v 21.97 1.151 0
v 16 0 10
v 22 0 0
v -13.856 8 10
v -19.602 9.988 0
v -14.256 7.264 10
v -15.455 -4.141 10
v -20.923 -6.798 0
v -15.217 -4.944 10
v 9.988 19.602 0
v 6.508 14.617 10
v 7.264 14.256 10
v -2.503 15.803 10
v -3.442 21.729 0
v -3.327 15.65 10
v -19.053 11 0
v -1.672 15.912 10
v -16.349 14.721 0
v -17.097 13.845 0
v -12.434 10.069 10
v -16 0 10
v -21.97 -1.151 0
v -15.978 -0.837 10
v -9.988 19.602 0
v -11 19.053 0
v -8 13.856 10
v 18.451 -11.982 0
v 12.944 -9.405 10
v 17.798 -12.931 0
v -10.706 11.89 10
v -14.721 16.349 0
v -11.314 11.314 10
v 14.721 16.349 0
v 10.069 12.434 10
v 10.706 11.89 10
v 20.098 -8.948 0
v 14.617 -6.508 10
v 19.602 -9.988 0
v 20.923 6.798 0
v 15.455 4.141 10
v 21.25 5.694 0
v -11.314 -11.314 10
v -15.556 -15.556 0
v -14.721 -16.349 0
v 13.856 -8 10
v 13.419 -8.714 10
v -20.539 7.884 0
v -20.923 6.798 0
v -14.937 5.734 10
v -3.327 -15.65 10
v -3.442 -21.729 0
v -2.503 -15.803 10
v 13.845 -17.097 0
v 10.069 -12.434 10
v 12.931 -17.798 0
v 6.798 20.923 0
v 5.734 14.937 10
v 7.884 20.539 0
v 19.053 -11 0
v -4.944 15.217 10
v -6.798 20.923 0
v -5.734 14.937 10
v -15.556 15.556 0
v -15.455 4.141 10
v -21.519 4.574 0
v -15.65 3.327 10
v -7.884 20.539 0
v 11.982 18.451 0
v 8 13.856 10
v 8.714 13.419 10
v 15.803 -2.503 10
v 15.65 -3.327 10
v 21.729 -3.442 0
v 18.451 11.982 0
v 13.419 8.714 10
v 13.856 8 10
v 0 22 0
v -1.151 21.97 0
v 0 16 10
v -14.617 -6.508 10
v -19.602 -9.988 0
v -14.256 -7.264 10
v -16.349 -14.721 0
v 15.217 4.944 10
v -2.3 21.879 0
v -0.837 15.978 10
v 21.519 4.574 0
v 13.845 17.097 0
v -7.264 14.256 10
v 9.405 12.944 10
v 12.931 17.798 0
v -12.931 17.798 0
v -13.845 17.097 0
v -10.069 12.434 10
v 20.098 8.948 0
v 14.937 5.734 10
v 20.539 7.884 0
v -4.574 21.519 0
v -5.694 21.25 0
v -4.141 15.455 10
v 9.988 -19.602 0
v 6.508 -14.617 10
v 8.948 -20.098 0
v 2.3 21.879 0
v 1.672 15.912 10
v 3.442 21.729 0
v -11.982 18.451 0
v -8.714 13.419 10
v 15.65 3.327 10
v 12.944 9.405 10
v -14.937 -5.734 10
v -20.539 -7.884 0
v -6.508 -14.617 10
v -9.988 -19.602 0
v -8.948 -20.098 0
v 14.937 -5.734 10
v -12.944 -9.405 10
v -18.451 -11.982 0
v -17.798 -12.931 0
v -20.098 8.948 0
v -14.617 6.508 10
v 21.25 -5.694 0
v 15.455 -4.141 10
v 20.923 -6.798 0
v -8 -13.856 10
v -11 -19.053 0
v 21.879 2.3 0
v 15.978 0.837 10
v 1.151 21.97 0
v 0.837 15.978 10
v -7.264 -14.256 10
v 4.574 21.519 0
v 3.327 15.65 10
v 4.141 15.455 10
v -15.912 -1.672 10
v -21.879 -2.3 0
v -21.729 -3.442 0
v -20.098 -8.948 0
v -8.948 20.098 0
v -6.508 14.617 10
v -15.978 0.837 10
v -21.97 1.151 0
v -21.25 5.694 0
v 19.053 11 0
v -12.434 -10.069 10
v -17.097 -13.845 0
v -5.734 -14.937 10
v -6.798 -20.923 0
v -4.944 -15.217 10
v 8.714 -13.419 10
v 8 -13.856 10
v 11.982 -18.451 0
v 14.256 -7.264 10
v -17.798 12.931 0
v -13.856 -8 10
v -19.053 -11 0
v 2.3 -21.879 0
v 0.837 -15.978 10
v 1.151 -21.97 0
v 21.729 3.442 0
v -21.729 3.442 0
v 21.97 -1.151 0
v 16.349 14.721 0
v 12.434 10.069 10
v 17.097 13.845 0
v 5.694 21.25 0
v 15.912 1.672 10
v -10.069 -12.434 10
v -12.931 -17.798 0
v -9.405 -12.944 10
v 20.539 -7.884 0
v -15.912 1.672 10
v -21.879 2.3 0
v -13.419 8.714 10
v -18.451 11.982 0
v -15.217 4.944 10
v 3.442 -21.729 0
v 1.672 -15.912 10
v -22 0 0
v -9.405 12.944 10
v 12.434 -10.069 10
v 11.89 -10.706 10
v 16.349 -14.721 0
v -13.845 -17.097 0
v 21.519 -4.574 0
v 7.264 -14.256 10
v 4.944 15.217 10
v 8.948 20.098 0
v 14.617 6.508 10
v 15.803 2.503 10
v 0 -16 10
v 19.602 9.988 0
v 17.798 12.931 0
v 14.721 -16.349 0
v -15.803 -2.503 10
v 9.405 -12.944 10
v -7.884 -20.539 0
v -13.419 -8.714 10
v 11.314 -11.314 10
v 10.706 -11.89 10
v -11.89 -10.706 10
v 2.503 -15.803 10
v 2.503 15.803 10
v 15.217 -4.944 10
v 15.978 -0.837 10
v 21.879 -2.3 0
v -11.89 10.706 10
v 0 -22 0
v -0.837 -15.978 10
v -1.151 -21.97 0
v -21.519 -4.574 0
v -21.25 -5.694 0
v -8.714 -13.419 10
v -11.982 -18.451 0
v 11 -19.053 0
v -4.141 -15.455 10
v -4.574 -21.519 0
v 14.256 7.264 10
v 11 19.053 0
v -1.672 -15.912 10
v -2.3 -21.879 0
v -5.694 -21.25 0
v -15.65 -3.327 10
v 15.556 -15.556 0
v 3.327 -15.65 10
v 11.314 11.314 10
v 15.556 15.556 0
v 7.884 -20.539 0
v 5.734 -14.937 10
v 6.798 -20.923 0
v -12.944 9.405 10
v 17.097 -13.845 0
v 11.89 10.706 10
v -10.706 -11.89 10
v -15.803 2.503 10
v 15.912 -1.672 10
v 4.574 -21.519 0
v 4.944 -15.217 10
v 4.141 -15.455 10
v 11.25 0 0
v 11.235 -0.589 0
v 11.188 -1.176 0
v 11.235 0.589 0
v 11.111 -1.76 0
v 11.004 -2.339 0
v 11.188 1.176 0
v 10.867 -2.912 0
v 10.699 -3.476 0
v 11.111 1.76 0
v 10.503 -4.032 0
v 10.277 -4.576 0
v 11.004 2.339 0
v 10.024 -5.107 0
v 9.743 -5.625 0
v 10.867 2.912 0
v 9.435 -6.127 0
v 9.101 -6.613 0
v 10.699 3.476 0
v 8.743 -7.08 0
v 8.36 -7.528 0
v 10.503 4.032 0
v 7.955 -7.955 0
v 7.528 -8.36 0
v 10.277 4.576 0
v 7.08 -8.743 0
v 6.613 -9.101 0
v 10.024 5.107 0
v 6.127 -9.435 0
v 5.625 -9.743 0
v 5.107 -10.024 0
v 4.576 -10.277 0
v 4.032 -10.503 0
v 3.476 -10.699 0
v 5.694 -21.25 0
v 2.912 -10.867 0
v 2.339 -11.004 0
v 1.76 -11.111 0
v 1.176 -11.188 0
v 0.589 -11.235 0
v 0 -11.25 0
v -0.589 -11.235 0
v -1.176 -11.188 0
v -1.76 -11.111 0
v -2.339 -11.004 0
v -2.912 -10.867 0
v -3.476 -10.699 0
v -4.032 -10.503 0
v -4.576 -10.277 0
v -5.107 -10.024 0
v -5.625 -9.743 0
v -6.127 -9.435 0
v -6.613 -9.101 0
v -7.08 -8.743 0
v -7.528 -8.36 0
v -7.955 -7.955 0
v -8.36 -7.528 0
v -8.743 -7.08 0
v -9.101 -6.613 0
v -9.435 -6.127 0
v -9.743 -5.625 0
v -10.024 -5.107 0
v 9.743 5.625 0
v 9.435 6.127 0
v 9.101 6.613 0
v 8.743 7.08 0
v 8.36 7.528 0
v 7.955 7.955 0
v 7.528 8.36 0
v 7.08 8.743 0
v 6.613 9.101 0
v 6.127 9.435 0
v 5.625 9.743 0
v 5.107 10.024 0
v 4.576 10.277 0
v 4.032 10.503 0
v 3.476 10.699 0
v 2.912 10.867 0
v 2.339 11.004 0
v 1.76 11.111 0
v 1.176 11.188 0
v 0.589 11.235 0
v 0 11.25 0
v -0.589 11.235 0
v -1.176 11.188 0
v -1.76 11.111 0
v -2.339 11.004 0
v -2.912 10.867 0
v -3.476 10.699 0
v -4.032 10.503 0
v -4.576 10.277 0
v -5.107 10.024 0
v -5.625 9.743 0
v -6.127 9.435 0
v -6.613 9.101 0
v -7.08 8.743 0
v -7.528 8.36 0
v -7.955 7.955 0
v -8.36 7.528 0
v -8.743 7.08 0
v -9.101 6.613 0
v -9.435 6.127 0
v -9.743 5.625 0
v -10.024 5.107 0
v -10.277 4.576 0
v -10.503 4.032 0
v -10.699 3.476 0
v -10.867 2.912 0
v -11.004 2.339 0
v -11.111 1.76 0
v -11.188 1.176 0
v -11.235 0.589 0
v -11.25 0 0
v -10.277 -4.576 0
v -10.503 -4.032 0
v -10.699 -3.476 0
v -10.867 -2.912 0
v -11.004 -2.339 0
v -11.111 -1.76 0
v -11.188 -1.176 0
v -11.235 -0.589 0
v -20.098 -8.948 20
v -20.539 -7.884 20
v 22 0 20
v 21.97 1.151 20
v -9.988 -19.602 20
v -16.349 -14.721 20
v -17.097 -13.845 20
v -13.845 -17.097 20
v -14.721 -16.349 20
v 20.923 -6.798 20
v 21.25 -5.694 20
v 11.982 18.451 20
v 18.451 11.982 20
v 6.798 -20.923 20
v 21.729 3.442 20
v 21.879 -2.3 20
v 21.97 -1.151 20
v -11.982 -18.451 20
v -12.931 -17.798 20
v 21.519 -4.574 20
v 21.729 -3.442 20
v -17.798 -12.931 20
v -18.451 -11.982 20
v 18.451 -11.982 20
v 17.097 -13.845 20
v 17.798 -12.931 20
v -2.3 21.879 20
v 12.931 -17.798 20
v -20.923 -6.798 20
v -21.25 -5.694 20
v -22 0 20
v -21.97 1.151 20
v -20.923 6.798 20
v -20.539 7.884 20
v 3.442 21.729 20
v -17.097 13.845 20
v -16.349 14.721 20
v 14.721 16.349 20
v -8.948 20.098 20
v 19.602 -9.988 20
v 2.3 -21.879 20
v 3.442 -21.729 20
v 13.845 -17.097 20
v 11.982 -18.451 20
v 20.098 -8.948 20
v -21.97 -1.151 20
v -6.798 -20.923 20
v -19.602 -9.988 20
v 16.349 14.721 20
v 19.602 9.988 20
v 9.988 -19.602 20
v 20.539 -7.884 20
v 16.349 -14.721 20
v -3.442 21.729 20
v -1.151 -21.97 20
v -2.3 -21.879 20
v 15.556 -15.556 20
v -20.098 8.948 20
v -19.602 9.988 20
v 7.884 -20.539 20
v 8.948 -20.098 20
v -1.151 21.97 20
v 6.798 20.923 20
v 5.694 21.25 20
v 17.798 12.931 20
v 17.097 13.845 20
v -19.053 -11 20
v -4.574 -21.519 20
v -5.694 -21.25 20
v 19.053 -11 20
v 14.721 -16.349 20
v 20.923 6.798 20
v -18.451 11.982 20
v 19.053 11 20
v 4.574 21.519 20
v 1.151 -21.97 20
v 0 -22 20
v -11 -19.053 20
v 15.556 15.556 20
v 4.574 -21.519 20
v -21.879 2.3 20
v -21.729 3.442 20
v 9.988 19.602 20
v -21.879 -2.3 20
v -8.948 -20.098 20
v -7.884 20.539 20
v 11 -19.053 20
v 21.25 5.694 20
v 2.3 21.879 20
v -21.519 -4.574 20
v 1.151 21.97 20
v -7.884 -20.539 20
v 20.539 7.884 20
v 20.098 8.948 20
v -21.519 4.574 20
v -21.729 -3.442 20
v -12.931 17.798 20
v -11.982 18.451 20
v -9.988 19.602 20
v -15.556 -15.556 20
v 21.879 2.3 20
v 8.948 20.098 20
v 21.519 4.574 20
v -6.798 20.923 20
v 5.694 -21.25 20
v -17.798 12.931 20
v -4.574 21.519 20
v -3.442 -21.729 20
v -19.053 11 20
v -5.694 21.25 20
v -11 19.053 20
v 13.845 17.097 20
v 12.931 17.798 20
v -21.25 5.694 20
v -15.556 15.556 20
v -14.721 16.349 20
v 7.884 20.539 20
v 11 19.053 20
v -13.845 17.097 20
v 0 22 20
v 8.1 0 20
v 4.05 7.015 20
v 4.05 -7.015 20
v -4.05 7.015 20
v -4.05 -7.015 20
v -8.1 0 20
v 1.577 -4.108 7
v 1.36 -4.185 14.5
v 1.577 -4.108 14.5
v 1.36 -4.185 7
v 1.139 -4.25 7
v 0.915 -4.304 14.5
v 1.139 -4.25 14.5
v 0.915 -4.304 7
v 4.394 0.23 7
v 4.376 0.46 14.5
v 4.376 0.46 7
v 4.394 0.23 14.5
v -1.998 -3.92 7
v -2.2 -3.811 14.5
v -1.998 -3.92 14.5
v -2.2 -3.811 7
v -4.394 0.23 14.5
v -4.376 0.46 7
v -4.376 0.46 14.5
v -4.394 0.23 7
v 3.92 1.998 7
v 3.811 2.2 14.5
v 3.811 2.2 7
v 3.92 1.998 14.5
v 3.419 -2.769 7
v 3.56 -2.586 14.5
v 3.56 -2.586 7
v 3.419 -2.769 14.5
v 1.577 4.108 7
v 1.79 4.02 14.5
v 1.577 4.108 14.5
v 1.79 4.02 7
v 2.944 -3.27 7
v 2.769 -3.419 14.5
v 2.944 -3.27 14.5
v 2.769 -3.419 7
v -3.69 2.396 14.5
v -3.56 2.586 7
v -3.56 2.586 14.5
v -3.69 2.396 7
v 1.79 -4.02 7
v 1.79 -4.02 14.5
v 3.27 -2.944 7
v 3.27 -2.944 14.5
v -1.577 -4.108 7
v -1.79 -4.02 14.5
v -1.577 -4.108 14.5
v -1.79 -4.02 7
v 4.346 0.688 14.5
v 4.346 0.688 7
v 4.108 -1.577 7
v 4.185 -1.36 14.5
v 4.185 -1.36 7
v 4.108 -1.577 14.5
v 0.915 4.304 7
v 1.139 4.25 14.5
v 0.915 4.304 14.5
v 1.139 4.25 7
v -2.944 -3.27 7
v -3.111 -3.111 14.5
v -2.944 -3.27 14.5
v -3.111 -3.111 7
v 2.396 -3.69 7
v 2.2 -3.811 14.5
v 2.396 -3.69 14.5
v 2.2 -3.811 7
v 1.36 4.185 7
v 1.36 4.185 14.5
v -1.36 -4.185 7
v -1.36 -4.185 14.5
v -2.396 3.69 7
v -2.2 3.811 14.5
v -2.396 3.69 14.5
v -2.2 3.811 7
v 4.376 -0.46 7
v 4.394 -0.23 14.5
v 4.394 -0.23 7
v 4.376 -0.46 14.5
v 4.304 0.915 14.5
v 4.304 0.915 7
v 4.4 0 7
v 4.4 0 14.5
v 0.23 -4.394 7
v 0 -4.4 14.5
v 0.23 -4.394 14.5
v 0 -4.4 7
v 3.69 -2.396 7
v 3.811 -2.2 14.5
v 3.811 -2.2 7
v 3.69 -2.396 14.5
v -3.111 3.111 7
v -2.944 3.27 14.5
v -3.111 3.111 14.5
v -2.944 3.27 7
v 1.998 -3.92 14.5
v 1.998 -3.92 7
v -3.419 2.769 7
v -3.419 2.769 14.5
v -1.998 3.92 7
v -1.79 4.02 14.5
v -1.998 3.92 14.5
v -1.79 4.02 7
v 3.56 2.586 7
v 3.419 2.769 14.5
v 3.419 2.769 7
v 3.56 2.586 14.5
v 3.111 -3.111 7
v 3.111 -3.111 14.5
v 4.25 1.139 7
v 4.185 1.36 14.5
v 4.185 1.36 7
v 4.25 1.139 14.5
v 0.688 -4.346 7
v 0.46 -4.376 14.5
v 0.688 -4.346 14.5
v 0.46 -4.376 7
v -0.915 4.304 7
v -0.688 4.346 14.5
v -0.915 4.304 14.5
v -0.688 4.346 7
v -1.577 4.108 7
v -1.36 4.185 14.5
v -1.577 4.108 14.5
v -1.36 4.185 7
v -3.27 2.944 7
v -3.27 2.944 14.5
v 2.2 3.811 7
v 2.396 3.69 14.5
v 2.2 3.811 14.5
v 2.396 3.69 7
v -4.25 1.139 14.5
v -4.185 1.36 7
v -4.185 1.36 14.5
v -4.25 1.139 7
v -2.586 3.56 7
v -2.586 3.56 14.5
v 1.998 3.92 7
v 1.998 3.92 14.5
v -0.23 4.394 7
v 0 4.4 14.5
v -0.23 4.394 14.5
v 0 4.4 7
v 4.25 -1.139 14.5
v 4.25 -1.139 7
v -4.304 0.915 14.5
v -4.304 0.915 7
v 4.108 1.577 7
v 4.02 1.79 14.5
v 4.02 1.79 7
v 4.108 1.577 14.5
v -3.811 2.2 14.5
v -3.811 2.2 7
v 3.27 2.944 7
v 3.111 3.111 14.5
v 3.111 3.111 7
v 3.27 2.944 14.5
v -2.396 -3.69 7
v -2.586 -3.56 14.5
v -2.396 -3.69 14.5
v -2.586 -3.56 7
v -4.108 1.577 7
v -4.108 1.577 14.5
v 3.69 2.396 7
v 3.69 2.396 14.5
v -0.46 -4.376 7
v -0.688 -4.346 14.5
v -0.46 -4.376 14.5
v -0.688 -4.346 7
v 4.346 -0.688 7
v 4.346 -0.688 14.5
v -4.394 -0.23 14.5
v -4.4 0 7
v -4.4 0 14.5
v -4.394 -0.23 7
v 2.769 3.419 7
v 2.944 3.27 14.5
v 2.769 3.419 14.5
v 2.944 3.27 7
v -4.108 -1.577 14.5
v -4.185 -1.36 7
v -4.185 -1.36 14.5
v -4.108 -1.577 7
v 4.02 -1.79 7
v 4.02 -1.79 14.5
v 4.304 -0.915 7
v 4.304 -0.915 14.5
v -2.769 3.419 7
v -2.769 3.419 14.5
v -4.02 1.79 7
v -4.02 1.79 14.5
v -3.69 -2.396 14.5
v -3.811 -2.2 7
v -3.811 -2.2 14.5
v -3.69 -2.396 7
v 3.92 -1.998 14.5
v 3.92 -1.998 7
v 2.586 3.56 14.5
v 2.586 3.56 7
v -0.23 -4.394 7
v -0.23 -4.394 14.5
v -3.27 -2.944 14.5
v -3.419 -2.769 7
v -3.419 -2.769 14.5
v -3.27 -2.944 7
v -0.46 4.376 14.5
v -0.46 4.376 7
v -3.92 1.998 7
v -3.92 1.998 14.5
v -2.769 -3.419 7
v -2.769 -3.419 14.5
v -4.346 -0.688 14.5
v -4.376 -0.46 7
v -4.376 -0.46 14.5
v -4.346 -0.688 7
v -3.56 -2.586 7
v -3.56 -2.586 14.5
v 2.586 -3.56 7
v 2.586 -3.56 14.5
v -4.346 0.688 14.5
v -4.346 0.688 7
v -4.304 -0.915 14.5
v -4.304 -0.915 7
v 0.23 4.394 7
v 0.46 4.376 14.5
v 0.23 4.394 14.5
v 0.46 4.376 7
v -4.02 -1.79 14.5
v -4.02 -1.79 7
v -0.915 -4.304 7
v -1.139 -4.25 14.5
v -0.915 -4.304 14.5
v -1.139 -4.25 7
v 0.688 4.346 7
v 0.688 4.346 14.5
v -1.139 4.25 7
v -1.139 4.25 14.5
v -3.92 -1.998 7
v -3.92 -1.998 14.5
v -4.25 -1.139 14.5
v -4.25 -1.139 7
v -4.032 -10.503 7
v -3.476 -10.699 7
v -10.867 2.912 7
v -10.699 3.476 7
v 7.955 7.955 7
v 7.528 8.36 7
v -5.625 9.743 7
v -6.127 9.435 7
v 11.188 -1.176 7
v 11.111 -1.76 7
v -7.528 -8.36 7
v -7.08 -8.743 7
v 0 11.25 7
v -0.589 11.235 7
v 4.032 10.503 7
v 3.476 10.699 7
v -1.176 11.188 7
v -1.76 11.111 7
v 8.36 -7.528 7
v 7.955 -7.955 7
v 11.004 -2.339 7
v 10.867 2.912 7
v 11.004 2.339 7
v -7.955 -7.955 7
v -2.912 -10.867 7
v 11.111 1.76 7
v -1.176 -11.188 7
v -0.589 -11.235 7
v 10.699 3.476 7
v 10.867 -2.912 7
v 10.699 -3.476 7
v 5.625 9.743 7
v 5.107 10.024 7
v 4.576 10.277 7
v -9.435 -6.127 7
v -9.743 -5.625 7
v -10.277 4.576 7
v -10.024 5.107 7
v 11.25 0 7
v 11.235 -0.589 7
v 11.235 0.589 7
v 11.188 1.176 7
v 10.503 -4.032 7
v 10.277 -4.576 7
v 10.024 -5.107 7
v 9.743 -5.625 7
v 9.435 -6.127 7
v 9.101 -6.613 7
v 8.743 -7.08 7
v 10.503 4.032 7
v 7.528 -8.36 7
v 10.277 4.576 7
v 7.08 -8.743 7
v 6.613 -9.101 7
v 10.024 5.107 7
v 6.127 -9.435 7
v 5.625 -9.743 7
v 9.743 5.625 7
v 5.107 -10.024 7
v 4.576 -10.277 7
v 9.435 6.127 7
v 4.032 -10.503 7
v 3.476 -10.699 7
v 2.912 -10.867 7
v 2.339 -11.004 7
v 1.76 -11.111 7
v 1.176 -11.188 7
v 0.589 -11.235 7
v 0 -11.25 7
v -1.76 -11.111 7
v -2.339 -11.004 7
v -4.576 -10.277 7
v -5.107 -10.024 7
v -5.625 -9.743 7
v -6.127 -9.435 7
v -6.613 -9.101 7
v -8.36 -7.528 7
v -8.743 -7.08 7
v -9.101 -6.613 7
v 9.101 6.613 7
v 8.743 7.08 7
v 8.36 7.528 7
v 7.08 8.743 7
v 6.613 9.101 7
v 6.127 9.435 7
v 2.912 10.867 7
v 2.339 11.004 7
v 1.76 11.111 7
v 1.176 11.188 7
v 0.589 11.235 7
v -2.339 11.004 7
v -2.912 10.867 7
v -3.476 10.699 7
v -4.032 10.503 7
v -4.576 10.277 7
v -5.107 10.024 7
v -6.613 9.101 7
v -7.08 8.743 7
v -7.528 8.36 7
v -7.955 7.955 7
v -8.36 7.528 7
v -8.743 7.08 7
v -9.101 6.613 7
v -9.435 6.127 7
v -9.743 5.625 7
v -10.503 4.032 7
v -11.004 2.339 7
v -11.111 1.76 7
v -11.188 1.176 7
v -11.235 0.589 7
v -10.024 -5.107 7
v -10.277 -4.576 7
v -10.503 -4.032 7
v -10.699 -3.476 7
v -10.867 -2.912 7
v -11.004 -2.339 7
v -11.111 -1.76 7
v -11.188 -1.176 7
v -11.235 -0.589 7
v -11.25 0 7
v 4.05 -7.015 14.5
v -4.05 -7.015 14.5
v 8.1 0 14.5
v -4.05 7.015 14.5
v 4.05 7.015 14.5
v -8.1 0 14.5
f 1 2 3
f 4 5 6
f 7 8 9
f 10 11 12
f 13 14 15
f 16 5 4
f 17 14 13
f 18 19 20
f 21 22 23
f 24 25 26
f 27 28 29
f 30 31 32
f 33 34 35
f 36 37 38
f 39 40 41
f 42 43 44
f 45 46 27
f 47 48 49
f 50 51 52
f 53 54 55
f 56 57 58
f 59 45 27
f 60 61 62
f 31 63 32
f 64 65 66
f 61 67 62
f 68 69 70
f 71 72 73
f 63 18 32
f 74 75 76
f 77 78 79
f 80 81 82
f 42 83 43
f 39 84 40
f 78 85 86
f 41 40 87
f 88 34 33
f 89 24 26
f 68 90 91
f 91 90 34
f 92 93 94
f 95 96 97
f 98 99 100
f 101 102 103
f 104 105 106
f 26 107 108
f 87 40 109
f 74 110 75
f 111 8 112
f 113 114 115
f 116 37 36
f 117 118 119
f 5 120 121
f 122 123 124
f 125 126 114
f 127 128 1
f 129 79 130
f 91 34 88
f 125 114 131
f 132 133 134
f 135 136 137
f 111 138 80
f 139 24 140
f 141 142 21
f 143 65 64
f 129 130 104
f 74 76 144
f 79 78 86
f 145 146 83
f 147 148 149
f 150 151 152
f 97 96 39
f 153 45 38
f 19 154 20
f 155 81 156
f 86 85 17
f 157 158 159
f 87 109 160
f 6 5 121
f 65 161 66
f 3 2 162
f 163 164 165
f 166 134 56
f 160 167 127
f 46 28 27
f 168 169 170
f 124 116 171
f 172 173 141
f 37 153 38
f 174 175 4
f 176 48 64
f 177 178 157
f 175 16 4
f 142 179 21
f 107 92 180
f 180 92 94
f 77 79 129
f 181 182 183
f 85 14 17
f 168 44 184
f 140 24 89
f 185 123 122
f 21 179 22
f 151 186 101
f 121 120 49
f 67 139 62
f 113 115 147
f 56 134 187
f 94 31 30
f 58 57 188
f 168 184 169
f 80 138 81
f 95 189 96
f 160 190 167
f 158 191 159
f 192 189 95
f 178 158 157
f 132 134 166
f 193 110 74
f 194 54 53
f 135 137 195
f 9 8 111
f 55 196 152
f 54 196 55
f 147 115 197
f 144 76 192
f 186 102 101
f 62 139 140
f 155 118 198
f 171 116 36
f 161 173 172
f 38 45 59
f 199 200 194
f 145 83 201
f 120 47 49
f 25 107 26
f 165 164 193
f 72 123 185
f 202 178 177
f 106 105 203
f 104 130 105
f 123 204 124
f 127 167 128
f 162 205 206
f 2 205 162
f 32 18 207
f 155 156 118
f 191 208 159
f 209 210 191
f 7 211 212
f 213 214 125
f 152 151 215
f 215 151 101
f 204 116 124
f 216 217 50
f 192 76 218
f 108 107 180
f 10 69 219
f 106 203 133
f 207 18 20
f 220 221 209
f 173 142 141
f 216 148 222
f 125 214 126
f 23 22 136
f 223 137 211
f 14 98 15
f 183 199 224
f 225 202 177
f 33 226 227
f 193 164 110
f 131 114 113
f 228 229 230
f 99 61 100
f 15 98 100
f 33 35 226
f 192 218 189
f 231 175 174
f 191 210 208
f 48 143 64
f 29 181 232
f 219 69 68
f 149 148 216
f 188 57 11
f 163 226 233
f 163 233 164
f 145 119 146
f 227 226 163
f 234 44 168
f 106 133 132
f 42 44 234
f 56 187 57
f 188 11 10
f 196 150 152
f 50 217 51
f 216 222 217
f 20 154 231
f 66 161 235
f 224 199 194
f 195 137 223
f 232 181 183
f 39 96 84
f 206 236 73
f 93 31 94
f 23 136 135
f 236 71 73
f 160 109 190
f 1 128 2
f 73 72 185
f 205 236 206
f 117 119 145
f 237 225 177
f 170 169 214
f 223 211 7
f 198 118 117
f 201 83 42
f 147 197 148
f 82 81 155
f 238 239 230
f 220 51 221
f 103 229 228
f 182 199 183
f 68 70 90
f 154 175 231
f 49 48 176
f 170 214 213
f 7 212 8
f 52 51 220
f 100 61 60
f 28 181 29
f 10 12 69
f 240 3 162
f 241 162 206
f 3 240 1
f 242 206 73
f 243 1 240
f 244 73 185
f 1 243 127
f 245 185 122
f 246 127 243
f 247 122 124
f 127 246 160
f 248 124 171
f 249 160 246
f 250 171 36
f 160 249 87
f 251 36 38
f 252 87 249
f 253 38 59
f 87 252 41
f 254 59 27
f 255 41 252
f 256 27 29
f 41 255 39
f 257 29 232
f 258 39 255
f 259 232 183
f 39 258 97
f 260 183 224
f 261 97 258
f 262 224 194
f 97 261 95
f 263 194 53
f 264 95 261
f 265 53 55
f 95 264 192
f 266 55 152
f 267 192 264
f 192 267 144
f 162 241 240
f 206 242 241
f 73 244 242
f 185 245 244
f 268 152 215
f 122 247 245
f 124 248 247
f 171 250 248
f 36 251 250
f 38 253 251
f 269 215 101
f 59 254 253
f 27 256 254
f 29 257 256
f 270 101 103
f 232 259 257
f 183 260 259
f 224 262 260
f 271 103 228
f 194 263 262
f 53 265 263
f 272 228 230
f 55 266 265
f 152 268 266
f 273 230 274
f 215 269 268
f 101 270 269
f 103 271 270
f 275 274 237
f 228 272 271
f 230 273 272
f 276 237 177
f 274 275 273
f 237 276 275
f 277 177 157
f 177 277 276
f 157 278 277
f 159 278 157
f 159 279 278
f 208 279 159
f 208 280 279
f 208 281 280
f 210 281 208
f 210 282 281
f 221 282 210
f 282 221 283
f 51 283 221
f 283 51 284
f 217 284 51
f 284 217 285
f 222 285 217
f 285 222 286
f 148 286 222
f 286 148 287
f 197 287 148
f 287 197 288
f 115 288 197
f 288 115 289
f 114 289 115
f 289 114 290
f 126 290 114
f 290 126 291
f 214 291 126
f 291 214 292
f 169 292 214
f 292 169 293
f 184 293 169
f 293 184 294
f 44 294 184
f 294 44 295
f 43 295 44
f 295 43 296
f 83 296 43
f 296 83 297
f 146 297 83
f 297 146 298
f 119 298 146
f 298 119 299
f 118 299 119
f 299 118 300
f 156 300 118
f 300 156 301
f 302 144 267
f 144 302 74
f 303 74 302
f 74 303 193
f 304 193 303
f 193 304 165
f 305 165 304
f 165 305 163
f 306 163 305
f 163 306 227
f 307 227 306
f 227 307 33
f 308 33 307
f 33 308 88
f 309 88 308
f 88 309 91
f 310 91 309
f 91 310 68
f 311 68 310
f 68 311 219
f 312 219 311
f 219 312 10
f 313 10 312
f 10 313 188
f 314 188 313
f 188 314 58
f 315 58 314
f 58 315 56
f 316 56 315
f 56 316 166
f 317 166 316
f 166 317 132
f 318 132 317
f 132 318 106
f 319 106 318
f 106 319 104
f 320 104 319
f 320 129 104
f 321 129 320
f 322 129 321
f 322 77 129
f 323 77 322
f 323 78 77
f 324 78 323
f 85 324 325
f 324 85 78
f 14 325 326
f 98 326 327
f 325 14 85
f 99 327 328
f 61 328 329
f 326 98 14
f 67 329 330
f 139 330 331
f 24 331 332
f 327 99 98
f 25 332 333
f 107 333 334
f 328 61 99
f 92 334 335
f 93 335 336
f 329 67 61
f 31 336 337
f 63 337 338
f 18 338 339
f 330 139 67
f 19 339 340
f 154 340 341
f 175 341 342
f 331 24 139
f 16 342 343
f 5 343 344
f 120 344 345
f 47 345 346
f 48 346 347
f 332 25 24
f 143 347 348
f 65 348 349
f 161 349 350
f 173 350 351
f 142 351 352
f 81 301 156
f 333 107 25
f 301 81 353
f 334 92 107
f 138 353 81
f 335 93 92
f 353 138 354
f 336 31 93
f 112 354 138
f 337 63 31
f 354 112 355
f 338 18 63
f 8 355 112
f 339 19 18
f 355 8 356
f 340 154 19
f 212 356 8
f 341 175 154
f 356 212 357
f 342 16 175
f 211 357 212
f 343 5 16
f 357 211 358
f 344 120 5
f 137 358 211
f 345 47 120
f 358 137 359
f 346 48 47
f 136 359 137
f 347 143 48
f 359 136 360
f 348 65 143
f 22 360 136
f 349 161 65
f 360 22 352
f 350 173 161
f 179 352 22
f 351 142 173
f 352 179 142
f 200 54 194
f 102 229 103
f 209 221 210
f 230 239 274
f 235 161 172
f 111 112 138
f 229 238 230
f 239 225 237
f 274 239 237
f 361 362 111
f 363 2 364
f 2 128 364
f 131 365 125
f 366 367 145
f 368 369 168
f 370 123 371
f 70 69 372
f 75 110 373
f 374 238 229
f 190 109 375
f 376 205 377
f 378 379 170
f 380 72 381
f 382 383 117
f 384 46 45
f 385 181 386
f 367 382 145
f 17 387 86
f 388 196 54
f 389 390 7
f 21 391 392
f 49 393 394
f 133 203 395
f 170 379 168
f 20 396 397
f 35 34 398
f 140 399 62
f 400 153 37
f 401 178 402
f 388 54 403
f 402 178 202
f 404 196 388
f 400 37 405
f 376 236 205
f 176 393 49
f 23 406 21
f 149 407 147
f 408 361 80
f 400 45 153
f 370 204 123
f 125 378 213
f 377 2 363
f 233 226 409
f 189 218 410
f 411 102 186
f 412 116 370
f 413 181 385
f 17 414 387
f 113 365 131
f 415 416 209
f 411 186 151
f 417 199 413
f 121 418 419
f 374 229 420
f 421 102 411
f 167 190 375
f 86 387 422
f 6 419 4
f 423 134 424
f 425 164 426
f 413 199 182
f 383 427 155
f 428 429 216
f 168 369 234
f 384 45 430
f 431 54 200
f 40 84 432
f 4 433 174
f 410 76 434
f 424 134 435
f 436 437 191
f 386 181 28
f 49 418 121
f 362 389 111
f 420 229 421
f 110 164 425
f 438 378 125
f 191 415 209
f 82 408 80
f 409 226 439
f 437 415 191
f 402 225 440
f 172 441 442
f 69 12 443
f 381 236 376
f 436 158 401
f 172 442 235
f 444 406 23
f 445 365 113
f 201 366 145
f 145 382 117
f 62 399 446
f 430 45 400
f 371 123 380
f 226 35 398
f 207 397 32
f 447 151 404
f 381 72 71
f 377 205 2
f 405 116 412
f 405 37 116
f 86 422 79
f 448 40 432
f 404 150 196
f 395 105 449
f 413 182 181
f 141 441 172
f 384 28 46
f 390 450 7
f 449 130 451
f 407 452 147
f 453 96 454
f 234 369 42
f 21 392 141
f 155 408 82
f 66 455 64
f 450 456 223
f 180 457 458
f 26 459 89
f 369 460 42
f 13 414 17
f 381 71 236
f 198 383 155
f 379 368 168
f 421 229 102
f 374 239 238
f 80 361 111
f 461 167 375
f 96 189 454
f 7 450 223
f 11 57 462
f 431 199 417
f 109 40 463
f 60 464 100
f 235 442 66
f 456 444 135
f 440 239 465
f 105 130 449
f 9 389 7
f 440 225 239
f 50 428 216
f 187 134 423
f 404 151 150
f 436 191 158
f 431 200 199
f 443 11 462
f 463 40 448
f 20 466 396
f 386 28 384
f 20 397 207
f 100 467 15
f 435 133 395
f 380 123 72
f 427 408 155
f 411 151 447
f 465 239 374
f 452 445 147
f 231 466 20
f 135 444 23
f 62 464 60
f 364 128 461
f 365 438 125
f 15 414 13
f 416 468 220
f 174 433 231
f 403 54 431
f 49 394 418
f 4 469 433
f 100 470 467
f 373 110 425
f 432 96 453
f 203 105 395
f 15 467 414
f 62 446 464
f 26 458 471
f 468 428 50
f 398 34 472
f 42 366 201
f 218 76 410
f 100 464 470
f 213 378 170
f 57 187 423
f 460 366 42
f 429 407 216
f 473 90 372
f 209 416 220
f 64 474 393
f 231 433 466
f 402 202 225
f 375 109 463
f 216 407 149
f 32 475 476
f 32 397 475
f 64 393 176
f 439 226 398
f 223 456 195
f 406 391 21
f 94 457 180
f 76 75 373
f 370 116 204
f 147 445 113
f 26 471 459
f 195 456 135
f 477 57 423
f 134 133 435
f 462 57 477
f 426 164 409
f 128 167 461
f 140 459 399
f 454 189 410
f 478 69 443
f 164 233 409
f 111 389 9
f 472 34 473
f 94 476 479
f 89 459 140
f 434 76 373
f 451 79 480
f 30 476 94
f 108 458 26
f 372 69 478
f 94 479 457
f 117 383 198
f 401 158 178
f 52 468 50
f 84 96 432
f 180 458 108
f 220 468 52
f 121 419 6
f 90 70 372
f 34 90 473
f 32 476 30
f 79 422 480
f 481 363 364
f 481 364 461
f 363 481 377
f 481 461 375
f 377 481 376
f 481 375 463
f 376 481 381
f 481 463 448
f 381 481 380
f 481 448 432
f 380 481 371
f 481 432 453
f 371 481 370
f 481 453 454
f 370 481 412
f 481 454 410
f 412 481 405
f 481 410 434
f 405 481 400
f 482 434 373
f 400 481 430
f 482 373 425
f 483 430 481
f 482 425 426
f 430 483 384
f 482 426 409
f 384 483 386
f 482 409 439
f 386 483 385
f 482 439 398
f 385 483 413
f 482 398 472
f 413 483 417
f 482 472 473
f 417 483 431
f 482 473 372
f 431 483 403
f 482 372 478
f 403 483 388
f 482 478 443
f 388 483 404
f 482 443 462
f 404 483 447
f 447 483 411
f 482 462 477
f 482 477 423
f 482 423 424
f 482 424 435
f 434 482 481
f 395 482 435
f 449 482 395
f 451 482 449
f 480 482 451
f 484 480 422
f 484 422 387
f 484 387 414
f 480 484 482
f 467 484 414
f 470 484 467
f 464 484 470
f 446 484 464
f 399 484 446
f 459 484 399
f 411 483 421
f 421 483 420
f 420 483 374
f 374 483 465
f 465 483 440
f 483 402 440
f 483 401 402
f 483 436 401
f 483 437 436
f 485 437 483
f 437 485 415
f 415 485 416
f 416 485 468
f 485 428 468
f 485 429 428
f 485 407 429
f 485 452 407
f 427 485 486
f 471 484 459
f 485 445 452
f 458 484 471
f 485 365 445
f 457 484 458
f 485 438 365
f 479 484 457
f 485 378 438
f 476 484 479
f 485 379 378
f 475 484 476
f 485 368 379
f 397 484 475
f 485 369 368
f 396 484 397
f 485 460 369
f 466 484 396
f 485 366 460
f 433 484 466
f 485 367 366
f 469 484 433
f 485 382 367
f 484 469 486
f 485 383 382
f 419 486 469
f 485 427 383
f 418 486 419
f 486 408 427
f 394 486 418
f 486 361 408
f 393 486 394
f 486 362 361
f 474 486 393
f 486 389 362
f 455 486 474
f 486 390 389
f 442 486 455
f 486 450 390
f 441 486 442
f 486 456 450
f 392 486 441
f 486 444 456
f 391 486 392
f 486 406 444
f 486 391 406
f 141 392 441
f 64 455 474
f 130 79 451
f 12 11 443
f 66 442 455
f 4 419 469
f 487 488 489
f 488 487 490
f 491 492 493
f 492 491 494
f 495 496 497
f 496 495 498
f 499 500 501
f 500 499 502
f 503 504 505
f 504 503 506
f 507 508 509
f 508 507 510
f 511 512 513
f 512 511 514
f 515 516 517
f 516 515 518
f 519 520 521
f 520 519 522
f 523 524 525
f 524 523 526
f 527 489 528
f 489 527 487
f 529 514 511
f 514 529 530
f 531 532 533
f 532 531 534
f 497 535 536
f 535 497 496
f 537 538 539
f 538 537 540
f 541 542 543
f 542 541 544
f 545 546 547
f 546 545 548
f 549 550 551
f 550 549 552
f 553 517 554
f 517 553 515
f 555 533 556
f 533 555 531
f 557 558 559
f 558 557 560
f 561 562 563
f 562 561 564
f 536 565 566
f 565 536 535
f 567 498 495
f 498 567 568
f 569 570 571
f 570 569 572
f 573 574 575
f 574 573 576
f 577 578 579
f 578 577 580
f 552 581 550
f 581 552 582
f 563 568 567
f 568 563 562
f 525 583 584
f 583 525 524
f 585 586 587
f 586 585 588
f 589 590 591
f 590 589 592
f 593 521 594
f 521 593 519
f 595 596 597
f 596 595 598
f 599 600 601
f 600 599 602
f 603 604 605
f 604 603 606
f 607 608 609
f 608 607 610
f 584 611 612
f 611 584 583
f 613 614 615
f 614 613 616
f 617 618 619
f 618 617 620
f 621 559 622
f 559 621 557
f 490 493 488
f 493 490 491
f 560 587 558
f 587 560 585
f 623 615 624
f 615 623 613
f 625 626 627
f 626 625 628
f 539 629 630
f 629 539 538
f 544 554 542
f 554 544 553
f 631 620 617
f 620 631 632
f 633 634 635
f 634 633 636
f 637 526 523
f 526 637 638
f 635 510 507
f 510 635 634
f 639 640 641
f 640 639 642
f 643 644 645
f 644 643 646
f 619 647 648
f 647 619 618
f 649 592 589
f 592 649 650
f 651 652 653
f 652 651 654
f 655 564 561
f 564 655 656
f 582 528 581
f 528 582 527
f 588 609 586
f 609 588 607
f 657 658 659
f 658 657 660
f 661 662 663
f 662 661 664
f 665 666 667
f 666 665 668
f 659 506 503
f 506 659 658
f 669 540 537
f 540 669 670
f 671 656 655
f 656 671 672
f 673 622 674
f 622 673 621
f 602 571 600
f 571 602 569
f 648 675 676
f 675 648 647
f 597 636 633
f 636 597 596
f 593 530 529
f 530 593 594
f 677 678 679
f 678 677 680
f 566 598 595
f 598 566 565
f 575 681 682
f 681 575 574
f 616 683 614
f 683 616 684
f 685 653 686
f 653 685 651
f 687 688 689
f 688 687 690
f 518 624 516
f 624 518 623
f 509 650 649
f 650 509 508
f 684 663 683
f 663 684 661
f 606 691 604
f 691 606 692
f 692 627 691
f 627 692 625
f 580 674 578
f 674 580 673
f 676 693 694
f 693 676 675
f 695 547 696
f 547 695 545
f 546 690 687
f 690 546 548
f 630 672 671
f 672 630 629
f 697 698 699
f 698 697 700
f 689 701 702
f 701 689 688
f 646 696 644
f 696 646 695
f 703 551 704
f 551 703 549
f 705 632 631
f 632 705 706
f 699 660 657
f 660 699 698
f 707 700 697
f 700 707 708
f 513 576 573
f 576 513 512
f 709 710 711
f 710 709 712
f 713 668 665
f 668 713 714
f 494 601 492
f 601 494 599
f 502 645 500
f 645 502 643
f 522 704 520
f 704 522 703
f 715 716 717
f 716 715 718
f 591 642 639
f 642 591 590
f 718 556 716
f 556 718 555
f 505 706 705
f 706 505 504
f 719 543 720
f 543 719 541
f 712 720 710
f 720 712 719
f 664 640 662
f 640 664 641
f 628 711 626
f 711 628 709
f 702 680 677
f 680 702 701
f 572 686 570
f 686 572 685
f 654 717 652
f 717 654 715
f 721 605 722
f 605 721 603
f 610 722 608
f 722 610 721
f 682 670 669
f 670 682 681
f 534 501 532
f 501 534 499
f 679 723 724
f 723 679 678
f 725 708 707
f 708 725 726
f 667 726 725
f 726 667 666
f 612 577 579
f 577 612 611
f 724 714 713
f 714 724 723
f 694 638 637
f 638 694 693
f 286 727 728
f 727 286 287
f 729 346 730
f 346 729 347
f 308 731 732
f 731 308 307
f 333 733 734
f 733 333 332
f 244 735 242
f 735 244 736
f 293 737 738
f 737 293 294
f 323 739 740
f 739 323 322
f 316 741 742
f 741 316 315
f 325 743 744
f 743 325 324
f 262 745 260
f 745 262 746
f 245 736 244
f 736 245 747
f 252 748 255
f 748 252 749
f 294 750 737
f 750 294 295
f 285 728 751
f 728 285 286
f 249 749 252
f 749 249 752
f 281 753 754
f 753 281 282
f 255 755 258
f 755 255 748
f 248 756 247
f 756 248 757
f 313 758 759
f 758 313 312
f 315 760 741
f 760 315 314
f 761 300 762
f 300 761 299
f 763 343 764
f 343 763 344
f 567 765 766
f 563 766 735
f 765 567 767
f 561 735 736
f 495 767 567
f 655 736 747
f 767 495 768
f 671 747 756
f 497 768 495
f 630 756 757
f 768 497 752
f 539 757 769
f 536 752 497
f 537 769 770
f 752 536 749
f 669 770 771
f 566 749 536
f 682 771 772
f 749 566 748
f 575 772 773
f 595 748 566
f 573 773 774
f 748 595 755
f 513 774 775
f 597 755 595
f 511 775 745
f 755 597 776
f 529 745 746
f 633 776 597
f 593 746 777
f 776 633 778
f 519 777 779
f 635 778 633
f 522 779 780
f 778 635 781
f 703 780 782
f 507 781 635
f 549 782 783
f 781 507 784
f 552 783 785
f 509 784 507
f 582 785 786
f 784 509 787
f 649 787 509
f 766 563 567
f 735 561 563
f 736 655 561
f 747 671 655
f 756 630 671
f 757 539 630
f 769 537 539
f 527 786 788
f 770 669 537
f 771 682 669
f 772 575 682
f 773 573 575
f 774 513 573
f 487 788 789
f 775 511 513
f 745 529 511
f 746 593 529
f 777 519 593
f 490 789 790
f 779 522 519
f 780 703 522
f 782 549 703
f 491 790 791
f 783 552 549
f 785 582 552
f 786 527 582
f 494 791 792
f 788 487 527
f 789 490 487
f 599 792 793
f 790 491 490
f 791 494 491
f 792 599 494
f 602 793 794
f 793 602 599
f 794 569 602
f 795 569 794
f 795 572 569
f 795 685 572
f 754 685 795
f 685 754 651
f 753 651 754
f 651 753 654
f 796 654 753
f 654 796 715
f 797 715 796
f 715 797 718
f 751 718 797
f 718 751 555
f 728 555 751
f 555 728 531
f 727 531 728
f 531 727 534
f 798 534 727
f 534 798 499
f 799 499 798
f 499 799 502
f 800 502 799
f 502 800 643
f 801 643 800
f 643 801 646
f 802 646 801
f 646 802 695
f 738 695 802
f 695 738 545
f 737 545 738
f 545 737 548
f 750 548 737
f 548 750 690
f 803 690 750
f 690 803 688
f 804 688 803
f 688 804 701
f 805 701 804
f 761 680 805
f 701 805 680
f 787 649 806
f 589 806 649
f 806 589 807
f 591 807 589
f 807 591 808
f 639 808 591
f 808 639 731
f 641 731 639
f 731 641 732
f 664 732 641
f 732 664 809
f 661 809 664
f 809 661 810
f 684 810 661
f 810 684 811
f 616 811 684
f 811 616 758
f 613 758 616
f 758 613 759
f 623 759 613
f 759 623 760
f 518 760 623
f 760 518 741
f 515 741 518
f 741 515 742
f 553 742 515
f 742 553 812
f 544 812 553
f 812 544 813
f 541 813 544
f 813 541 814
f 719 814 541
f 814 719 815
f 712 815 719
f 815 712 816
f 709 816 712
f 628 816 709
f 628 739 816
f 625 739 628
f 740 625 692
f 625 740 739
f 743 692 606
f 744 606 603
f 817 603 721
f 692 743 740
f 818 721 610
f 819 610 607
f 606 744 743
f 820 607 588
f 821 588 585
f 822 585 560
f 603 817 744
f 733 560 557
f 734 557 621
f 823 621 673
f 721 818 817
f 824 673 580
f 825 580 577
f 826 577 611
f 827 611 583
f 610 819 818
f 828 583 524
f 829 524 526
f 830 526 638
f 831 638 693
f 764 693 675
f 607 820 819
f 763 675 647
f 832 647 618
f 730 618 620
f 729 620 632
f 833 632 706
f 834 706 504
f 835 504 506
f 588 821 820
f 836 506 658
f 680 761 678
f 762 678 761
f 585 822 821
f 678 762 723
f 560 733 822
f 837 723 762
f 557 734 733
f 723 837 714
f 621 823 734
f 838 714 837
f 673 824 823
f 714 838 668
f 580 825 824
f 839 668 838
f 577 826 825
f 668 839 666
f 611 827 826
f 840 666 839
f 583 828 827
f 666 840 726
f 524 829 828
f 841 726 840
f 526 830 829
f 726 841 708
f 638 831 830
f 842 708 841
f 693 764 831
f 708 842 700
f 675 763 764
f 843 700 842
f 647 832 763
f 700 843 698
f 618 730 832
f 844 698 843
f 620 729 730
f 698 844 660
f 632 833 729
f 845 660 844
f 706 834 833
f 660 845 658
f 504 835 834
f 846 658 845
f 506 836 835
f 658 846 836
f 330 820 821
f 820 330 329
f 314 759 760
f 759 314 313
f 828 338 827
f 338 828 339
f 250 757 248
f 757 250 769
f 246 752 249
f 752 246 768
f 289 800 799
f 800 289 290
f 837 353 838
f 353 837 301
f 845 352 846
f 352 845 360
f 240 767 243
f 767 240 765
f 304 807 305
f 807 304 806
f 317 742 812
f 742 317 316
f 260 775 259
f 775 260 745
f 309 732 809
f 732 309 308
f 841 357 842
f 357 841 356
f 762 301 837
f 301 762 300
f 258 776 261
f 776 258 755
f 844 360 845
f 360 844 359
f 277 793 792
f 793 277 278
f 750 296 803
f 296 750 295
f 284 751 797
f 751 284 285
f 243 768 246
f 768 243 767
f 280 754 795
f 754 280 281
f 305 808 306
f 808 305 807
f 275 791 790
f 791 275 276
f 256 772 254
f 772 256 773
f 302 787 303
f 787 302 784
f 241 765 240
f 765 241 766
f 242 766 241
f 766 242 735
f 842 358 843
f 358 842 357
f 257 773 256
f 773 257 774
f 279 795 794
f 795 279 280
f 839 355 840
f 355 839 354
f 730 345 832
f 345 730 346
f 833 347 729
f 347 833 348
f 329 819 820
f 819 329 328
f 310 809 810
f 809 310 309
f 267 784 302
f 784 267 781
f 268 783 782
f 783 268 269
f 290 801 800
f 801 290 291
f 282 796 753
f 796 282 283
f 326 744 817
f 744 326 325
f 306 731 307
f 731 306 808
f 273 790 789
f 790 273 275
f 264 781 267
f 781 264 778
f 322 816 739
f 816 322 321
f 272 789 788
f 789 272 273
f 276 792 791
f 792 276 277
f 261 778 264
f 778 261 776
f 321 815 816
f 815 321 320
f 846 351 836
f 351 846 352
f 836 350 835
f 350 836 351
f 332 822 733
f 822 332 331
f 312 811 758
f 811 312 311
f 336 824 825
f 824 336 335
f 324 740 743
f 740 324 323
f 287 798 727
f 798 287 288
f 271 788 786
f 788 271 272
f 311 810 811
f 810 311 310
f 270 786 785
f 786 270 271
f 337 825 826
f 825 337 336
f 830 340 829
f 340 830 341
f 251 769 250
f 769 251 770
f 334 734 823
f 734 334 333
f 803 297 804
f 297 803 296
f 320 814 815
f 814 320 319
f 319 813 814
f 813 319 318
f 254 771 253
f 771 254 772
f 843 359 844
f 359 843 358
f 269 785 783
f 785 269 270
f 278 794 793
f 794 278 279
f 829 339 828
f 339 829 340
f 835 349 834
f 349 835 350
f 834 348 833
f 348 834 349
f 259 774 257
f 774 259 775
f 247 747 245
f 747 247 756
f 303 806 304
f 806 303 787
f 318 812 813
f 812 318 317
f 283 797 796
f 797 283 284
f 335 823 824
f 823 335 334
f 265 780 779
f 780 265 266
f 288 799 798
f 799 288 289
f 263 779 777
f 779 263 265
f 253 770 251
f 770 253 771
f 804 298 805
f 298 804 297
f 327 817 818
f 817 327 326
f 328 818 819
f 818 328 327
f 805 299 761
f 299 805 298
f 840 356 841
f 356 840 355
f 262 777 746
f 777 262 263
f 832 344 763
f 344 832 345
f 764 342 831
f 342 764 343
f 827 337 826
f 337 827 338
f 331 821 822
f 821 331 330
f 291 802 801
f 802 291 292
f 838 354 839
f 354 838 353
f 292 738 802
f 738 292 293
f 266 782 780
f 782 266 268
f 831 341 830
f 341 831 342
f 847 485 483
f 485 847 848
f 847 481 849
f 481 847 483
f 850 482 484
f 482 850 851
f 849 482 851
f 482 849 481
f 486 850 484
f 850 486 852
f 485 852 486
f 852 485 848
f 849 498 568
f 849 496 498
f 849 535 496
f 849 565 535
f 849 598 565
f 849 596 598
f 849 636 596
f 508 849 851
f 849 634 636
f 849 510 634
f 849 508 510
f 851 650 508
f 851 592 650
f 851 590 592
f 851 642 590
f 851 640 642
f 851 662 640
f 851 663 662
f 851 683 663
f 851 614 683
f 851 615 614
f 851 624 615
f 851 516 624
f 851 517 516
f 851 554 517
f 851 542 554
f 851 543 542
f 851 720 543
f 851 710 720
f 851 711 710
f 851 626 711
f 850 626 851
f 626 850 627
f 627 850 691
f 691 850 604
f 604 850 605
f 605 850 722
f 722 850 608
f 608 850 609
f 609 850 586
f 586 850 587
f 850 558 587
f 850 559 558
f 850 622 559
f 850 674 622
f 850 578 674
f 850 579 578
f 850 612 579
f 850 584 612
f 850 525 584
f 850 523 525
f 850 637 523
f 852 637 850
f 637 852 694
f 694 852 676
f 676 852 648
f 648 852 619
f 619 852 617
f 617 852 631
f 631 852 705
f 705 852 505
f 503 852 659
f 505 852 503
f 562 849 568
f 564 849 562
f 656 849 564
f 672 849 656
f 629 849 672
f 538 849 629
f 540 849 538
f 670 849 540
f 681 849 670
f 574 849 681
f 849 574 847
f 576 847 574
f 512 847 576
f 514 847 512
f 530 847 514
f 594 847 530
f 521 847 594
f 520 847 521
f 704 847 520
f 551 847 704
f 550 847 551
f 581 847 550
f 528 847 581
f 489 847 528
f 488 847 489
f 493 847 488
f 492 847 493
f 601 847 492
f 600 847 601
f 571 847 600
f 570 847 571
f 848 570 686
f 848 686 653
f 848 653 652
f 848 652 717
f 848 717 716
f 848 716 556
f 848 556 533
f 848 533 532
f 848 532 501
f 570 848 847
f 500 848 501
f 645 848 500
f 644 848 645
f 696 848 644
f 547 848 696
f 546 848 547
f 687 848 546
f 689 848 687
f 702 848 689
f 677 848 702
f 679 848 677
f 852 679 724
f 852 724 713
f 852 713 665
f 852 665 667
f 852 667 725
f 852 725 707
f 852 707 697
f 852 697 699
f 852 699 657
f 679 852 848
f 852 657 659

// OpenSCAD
// The final file --- set [include_bolt_head] to true for the centre roller, or false
// for the outer ones

radius_base            = 12;
radius_smallest        = 4;
radius_largest         = 10;
half_height            = 10;

bolt_head_height       = 5.6;
bolt_head_diameter     = 16.2;

bearing_height         = 7;
bearing_outer_diameter = 22.5;
bearing_hole_diameter  = 8.8;


include_bolt_head      = true;

epsilon                = 0.1;

$fn = 120;

difference() {
    union() {
        cylinder(h=half_height, r1=radius_base + radius_largest, r2=radius_base + radius_smallest);
        translate([0,0,half_height])
            cylinder(h=half_height, r1=radius_base + radius_smallest, r2=radius_base + radius_largest);
    }
    union() {
        translate([0,0,-epsilon]) cylinder(h=2*(half_height+epsilon), d=bearing_hole_diameter);
        translate([0,0,-epsilon]) cylinder(h=bearing_height + epsilon, d=bearing_outer_diameter);
        if (include_bolt_head)
            translate([0,0,2*half_height-bolt_head_height+epsilon])
              cylinder(h=bolt_head_height + epsilon, d=bolt_head_diameter, $fn=6);
    }
}
